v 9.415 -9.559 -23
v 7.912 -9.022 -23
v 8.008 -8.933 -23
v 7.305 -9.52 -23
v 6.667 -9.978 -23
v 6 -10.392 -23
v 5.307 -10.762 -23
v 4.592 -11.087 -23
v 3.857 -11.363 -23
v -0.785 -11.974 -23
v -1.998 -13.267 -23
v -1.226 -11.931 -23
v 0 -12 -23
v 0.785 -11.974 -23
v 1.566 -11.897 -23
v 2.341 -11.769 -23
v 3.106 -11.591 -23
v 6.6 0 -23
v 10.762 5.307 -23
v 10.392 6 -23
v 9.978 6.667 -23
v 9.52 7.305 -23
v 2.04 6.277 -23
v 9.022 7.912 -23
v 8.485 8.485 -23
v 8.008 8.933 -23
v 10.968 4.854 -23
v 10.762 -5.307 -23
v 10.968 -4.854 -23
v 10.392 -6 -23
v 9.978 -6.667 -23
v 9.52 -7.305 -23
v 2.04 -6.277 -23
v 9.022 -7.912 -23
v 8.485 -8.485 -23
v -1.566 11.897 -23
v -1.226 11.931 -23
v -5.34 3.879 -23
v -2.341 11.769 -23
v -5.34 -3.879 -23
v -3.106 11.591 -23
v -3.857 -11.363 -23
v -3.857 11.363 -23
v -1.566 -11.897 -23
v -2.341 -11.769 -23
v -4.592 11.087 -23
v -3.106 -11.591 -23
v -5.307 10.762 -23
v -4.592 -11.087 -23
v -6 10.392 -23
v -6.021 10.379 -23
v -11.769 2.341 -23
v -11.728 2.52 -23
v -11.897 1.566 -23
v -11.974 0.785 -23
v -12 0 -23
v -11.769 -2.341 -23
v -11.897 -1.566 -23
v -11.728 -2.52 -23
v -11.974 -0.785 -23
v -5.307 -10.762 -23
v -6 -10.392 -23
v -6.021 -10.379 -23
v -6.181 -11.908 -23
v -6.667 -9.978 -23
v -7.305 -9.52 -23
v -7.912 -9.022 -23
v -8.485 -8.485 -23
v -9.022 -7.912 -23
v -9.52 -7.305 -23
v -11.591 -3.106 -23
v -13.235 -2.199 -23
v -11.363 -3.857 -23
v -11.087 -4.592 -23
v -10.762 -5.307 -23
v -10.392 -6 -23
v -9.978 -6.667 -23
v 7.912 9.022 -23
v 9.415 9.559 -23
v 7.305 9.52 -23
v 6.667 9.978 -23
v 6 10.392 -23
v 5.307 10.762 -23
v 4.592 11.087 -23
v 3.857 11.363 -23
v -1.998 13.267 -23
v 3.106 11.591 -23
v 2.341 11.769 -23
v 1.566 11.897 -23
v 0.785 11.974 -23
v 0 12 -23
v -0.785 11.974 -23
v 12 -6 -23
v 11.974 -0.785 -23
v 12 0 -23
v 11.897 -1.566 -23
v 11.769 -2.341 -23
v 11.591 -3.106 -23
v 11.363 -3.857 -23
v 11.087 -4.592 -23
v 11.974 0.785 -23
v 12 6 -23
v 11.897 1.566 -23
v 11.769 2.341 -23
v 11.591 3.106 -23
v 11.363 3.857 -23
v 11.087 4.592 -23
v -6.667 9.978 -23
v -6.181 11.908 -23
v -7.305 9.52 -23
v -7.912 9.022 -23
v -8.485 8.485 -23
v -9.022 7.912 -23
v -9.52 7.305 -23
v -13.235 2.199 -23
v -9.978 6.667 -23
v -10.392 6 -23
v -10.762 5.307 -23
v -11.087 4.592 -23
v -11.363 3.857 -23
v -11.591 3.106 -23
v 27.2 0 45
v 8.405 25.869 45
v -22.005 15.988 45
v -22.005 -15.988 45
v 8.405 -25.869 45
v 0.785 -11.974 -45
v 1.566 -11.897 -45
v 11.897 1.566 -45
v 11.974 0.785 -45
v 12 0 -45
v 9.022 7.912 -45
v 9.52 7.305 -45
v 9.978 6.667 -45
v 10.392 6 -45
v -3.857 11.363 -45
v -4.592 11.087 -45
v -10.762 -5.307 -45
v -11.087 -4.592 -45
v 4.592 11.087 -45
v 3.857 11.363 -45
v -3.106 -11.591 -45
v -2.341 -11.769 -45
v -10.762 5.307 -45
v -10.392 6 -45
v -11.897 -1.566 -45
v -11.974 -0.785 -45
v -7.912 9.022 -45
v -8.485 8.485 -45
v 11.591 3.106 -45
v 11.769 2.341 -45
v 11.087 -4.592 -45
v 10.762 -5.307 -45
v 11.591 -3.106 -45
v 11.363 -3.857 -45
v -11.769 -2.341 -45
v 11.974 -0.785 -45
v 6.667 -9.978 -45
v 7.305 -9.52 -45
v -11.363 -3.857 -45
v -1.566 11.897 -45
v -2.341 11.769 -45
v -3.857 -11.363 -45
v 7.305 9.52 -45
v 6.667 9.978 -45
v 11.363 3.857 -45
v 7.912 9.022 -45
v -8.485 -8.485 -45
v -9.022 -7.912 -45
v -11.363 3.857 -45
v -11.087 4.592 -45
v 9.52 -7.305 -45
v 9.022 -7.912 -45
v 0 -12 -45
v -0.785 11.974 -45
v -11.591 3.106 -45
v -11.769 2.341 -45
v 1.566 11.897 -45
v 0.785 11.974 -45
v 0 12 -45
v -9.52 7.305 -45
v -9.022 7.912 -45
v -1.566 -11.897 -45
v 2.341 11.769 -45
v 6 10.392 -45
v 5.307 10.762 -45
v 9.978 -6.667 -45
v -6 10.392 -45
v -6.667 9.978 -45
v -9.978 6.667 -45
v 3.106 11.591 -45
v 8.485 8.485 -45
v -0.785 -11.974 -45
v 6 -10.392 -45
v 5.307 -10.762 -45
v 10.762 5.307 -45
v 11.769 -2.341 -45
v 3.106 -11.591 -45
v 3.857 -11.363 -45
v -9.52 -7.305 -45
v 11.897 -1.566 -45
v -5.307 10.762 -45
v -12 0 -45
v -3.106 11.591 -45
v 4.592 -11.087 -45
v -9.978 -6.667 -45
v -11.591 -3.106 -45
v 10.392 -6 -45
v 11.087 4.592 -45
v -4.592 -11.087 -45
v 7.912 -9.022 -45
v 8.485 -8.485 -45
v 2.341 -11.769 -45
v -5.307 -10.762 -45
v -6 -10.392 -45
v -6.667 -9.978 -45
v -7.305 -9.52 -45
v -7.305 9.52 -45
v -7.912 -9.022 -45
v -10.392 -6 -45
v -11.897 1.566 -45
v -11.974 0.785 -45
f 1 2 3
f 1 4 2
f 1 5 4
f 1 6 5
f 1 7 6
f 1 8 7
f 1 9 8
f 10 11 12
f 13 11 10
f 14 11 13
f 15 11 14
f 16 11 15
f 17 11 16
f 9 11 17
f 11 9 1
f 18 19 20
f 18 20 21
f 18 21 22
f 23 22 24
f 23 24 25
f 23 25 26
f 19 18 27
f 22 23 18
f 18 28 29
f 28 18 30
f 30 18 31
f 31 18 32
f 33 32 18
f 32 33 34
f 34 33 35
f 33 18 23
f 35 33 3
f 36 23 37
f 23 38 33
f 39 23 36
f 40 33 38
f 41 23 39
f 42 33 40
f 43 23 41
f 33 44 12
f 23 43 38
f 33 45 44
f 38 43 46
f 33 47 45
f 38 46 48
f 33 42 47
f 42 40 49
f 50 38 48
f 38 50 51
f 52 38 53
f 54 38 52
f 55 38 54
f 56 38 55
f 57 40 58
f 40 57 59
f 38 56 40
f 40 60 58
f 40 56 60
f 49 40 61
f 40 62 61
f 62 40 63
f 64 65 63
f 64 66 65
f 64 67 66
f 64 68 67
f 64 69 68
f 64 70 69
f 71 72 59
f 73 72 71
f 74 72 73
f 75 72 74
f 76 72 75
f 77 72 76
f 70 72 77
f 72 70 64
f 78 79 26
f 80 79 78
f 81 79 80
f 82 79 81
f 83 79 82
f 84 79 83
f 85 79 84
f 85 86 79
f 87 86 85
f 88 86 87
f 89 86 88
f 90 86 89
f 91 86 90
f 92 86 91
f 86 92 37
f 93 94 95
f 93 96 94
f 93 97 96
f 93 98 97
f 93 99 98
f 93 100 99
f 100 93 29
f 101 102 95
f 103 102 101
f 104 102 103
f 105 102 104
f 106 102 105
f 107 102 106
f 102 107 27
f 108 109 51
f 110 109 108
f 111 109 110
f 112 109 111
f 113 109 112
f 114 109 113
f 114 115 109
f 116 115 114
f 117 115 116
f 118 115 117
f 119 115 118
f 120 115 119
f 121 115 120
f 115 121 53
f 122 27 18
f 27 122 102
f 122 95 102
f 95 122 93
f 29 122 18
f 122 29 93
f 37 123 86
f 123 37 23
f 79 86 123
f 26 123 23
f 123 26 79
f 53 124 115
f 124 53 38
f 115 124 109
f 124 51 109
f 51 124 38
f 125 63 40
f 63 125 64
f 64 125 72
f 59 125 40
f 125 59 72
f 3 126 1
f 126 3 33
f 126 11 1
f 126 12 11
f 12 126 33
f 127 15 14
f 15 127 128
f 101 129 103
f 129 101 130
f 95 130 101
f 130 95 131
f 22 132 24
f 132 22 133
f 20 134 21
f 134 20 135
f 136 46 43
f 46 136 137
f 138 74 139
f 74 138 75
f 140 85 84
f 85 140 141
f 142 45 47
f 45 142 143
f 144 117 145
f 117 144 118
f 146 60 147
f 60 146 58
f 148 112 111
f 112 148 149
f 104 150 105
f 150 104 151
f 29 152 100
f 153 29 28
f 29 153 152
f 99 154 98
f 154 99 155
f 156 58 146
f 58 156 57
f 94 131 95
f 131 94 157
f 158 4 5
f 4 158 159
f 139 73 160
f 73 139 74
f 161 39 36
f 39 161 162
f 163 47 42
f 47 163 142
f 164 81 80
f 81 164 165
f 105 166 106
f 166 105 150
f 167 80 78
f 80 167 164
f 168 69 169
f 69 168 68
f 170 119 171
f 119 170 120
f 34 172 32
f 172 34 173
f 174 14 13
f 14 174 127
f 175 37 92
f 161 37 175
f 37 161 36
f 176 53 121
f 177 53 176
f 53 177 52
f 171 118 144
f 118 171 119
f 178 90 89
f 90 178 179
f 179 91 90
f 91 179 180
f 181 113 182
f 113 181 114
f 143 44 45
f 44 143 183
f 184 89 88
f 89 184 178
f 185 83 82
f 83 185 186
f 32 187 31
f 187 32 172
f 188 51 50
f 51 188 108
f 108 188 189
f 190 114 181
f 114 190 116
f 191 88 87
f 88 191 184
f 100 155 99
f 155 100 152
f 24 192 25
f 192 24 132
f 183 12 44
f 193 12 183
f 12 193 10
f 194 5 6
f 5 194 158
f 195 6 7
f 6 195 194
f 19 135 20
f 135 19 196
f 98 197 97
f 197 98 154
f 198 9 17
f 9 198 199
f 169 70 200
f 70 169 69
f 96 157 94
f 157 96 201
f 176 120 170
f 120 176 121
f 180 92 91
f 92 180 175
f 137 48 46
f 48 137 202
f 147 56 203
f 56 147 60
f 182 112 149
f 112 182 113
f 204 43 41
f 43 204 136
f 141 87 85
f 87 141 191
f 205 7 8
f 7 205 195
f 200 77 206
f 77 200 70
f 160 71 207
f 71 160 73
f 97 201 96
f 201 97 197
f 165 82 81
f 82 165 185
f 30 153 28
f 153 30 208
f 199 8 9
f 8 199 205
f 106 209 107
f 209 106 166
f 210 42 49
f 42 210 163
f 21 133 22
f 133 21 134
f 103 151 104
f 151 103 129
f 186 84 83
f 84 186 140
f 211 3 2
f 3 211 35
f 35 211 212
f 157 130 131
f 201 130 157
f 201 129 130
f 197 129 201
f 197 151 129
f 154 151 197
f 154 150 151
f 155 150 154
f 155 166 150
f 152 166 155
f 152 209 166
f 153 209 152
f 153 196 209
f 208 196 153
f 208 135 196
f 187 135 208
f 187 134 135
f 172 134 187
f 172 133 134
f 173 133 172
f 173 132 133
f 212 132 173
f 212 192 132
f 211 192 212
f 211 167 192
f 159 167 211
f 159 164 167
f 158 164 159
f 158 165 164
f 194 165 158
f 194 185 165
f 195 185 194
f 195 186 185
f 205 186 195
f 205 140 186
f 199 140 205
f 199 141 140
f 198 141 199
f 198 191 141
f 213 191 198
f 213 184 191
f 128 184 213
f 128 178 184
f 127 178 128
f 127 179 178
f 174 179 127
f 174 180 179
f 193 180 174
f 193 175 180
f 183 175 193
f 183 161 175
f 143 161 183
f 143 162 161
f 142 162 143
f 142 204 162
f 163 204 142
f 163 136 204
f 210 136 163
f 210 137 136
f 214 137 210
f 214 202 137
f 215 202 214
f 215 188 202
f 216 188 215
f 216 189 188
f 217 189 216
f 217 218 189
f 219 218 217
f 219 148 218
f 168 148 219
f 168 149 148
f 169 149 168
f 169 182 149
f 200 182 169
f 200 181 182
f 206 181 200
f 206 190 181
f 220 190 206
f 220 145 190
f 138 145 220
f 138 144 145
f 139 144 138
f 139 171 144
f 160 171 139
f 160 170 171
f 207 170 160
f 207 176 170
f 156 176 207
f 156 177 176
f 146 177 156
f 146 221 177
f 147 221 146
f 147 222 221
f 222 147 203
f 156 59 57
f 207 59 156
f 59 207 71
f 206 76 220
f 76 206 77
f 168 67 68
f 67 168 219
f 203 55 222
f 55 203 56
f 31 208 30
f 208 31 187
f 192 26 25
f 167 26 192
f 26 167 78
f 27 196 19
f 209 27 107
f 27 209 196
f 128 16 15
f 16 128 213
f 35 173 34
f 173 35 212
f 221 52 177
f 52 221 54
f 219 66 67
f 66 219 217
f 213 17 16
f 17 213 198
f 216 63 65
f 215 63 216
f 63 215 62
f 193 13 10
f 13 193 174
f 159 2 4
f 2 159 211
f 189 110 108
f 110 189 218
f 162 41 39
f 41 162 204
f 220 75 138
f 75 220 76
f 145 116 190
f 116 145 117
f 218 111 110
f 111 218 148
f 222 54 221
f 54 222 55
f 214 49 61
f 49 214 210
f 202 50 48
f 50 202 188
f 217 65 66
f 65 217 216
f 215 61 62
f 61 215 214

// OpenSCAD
$fn=96;

bbox_x = 54.4;
bbox_y = 57.1;
bbox_z = 90.0;

Rmax = min(bbox_x, bbox_y)/2;   // 27.2
H = bbox_z;                     // 90

hub_r = 12.0;
hub_h = 22.0;

tip_r = Rmax;
tip_h = H;

base_z = -H/2;
hub_z0 = base_z;
hub_z1 = base_z + hub_h;

module lobe(angle=0, base_r=hub_r, tip_r=tip_r, z0=hub_z1, z1=H/2, w=12.0){
    rotate([0,0,angle])
    polyhedron(
        points=[
            [ base_r, -w/2, z0],  // 0
            [ base_r,  w/2, z0],  // 1
            [ base_r*0.55, 0, z0],// 2
            [ tip_r, 0, z1]       // 3
        ],
        faces=[
            [0,1,2],
            [0,3,1],
            [1,3,2],
            [2,3,0]
        ],
        convexity=10
    );
}

module hub(r=hub_r, h=hub_h){
    translate([0,0,base_z + h/2])
        cylinder(r=r, h=h, center=true);
}

module star_solid(){
    union(){
        hub();
        for(i=[0:4]) lobe(angle=i*72, w=12.0);
    }
}

star_solid();
